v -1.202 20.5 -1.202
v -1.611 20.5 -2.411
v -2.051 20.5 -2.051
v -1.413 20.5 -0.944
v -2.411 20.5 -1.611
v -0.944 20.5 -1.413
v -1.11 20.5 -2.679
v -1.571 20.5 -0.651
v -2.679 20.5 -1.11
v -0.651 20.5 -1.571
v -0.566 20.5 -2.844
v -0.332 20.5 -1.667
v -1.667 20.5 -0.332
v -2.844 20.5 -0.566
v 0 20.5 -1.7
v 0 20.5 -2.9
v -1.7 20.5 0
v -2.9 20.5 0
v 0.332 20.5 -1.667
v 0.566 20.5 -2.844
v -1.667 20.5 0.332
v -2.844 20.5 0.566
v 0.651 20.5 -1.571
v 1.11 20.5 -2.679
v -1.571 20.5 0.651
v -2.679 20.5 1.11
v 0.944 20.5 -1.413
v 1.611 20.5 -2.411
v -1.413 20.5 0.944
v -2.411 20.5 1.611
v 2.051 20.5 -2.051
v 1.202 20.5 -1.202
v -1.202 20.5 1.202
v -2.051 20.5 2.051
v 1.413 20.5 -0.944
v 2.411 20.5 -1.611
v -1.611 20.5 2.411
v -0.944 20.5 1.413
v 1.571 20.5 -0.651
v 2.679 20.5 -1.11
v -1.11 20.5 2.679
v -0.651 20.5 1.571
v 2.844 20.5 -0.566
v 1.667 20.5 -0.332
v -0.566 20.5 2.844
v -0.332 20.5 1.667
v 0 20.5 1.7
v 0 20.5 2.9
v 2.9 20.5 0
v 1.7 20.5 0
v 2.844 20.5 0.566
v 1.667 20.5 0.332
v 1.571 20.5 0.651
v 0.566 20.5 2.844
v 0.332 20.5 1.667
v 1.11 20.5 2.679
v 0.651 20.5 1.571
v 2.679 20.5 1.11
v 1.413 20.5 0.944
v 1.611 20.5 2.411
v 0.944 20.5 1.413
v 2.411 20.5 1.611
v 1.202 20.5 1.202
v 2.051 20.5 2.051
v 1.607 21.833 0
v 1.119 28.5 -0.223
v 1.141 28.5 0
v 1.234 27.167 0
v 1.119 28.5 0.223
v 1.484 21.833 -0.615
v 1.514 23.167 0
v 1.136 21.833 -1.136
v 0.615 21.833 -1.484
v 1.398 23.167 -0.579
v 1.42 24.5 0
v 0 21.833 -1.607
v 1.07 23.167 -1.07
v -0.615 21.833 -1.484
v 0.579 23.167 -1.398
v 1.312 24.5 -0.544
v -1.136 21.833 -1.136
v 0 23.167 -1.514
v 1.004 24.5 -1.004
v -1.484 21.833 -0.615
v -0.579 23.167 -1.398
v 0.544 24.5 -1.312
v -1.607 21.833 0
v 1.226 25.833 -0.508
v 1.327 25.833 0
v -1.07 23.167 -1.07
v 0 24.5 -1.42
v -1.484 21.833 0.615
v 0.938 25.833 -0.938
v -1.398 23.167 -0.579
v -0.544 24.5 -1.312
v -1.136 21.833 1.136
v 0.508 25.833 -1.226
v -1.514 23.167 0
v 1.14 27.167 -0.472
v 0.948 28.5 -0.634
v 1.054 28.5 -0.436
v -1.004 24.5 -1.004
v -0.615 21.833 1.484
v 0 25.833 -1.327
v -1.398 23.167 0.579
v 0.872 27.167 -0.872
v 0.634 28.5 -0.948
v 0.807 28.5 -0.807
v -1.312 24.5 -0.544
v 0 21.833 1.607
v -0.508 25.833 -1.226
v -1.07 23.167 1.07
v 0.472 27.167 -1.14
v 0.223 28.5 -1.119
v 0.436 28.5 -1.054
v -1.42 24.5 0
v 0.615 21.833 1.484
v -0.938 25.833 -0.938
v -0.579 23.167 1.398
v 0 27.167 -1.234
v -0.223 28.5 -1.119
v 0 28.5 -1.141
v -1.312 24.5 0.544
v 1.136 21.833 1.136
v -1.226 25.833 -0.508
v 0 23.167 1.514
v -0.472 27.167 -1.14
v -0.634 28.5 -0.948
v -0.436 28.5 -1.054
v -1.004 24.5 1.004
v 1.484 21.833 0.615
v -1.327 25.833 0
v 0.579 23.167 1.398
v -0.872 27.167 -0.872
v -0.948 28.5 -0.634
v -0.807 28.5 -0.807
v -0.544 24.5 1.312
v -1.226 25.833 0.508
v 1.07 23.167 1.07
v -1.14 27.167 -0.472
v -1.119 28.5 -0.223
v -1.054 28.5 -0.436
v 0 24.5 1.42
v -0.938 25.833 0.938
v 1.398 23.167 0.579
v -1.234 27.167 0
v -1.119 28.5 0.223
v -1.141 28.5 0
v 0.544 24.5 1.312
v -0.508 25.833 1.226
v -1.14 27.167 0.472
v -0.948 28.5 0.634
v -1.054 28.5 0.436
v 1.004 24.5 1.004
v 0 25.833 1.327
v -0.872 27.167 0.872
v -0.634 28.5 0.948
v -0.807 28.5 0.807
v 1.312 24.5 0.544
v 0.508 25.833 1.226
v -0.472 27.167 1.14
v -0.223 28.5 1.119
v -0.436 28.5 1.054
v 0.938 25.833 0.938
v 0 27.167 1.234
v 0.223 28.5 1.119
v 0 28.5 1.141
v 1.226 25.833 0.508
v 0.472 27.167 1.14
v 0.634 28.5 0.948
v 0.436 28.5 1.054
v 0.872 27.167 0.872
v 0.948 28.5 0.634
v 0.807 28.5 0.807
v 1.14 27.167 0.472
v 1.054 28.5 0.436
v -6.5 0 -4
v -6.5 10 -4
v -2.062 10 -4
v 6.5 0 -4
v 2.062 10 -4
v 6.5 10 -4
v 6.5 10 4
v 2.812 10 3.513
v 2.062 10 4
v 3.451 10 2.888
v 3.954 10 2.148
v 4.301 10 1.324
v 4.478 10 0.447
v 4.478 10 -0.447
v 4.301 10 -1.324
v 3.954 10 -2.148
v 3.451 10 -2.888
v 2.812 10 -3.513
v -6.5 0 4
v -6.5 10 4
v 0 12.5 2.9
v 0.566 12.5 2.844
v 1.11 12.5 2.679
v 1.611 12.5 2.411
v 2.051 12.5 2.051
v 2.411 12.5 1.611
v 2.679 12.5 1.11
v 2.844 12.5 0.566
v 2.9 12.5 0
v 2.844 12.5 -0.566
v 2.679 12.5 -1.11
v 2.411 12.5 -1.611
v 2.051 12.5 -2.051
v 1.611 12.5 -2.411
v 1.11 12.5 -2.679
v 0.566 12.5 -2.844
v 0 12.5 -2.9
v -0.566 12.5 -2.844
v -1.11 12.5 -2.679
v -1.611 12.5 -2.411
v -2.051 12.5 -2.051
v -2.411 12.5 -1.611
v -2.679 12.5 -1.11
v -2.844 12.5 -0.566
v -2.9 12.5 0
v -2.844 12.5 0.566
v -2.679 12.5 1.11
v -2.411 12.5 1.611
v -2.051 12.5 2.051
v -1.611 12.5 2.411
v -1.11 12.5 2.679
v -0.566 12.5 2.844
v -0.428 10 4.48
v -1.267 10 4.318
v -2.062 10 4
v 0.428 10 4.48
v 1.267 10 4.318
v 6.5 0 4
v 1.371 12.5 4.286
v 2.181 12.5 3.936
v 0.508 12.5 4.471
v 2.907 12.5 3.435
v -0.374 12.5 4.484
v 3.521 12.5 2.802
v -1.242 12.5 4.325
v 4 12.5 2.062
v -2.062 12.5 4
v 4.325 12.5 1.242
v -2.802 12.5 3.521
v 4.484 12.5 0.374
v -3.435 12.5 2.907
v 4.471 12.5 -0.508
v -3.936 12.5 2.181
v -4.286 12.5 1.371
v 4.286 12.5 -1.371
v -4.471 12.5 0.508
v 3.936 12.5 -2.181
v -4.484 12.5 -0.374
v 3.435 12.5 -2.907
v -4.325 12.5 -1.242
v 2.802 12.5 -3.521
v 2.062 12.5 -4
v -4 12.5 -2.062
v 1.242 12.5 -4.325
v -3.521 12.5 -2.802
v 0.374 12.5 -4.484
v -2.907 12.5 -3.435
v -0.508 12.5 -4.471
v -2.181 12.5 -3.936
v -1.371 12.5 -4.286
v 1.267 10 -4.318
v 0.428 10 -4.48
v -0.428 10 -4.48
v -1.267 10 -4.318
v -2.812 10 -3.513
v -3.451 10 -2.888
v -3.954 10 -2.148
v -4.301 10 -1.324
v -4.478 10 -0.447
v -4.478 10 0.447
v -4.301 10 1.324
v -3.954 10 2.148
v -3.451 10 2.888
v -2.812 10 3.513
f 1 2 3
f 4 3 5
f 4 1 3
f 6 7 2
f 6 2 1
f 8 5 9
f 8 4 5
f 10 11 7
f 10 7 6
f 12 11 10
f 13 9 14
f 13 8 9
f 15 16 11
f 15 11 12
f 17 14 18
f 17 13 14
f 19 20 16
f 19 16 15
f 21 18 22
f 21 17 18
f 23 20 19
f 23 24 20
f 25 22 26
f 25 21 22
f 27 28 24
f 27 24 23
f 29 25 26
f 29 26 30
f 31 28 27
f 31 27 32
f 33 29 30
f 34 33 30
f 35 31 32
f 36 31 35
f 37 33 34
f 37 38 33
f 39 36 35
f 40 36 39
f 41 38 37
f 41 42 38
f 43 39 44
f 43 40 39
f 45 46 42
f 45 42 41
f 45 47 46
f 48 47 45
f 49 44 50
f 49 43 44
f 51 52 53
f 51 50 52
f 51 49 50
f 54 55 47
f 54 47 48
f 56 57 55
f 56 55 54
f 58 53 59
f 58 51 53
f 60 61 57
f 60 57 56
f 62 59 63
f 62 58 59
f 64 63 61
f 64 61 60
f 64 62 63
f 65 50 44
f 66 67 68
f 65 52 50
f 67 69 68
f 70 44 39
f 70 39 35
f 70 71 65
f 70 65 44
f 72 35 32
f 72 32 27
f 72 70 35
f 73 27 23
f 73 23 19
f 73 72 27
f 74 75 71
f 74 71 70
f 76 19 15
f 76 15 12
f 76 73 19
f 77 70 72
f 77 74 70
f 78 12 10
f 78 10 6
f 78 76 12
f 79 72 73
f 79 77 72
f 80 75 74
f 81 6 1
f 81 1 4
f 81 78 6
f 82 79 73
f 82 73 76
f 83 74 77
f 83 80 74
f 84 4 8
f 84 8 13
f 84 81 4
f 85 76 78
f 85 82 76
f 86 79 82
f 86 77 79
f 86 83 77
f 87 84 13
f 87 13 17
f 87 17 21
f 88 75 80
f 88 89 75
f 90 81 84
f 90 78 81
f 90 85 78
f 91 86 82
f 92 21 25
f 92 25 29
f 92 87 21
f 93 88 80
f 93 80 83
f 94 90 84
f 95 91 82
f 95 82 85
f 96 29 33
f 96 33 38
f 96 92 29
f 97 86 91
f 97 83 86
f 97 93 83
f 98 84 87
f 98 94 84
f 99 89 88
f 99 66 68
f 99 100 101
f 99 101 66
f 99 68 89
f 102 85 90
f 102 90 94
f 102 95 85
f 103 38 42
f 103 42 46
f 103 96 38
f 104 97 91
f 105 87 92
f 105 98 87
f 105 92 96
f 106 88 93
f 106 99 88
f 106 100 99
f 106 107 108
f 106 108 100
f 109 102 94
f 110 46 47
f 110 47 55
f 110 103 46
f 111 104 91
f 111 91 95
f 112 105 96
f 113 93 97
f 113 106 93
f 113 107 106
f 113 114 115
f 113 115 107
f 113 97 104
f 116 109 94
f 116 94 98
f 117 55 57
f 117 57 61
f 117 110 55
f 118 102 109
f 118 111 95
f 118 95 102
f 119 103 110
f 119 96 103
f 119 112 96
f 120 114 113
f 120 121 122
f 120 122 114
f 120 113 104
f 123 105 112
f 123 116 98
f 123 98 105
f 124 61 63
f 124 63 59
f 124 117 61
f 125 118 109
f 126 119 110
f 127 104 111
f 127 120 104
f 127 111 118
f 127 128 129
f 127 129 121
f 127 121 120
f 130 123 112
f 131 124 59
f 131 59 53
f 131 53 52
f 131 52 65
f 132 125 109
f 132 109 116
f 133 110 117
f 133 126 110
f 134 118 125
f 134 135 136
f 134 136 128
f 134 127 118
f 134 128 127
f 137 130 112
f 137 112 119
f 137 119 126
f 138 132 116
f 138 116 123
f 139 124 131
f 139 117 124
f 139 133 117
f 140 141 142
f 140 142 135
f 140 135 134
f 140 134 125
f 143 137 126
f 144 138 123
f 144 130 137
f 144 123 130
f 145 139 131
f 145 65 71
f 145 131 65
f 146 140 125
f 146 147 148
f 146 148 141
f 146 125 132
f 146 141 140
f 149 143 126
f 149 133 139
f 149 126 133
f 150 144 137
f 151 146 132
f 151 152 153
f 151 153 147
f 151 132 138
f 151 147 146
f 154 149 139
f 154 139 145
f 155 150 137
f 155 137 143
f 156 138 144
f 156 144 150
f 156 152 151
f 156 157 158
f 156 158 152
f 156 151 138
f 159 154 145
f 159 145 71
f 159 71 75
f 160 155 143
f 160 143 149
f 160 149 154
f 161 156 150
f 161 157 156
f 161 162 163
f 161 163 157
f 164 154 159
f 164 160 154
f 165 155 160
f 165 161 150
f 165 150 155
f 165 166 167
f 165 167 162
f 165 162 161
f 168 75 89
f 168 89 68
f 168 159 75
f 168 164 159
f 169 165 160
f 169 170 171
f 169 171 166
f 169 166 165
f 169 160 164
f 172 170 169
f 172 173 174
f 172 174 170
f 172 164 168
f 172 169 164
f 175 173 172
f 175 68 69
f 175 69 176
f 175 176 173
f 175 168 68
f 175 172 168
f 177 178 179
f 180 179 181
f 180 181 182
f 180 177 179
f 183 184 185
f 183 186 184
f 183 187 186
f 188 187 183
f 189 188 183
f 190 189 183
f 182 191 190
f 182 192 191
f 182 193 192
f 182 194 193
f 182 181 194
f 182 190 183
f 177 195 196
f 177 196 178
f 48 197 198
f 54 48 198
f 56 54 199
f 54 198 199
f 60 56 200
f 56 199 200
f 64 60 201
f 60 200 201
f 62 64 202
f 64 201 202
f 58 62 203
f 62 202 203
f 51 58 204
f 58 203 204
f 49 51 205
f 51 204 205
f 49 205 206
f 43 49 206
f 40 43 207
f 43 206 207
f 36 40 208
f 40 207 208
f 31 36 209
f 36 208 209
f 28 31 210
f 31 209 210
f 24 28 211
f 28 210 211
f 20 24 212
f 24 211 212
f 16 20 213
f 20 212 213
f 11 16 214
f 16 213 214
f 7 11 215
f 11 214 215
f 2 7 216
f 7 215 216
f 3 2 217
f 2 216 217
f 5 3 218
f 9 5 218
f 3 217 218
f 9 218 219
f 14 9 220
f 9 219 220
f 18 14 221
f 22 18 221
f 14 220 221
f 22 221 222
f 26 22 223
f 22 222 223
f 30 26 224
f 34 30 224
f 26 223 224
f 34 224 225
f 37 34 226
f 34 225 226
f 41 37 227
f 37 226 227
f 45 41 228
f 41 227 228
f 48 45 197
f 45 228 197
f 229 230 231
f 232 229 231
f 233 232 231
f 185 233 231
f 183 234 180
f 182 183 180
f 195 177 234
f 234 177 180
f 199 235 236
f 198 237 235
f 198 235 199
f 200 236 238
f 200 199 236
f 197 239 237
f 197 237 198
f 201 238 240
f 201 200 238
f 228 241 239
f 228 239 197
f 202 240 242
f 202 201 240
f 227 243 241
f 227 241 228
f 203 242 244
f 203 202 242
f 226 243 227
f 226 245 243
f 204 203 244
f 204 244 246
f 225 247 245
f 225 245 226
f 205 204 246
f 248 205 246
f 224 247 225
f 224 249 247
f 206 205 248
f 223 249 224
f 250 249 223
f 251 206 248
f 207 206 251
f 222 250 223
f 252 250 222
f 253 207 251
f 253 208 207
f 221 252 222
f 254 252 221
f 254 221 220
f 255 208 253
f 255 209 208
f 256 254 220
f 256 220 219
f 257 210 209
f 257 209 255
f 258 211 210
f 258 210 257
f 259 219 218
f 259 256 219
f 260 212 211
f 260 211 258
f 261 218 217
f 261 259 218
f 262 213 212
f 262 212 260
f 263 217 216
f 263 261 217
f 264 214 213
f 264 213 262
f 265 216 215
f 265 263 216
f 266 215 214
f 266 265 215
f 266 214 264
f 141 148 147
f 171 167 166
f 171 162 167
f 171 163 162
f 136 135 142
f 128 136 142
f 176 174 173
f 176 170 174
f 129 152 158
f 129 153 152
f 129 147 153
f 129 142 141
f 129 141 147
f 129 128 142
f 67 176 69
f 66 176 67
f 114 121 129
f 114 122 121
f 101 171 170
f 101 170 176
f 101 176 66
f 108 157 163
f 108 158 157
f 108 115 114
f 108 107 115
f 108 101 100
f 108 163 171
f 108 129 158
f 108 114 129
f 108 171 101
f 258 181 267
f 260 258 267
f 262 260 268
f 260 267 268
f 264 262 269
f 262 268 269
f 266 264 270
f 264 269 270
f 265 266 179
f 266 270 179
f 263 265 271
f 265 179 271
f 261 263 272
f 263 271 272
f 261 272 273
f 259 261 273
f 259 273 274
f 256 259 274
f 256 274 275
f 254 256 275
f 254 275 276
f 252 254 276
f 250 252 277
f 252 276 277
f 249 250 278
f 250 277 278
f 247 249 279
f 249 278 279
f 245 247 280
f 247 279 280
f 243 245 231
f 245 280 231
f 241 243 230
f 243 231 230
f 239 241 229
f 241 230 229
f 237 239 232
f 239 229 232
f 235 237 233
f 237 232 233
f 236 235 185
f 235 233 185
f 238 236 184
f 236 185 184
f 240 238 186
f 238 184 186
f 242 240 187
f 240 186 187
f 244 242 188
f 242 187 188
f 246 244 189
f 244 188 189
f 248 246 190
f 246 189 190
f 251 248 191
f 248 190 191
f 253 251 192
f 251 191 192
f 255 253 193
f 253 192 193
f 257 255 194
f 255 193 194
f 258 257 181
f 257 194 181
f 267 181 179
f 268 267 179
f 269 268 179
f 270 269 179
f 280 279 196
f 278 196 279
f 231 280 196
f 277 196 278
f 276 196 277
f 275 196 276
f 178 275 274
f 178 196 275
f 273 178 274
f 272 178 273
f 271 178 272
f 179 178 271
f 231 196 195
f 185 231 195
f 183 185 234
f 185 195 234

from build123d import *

# Parameters (mm, degrees)
ESQUISSE1_W        = 13
ESQUISSE1_H        = 8
BOSS_EXTRU_1_DEPTH = 10
ESQUISSE2_R        = 4.5
BOSS_EXTRU_2_DEPTH = 2.5
ESQUISSE3_R        = 2.9
BOSS_EXTRU_3_DEPTH = 8
ESQUISSE4_R        = 1.7
BOSS_EXTRU_4_DEPTH = 8
BOSS_EXTRU_4_TAPER = 4


with BuildPart() as part:
    # Esquisse1 → Boss.-Extru.1 (new body)
    with BuildSketch(Plane(origin=(0, 0, 0), x_dir=(1, 0, 0), z_dir=(0, 1, 0))):
        Rectangle(ESQUISSE1_W, ESQUISSE1_H)
    extrude(amount=BOSS_EXTRU_1_DEPTH)

    # Esquisse2 → Boss.-Extru.2 (add)
    with BuildSketch(Plane(origin=(0, 10, 0), x_dir=(1, 0, 0), z_dir=(0, 1, 0))):
        with Locations(Location((0, 0, 0), (0, 0, 62.733955549))):
            Circle(ESQUISSE2_R)
    extrude(amount=BOSS_EXTRU_2_DEPTH)

    # Esquisse3 → Boss.-Extru.3 (add)
    with BuildSketch(Plane(origin=(0, 12.5, 0), x_dir=(1, 0, 0), z_dir=(0, 1, 0))):
        with Locations(Location((0, 0, 0), (0, 0, 270))):
            Circle(ESQUISSE3_R)
    extrude(amount=BOSS_EXTRU_3_DEPTH)

    # Esquisse4 → Boss.-Extru.4 (add)
    with BuildSketch(Plane(origin=(0, 20.5, 0), x_dir=(1, 0, 0), z_dir=(0, 1, 0))):
        Circle(ESQUISSE4_R)
    extrude(amount=BOSS_EXTRU_4_DEPTH, taper=BOSS_EXTRU_4_TAPER)


solid = part.part
